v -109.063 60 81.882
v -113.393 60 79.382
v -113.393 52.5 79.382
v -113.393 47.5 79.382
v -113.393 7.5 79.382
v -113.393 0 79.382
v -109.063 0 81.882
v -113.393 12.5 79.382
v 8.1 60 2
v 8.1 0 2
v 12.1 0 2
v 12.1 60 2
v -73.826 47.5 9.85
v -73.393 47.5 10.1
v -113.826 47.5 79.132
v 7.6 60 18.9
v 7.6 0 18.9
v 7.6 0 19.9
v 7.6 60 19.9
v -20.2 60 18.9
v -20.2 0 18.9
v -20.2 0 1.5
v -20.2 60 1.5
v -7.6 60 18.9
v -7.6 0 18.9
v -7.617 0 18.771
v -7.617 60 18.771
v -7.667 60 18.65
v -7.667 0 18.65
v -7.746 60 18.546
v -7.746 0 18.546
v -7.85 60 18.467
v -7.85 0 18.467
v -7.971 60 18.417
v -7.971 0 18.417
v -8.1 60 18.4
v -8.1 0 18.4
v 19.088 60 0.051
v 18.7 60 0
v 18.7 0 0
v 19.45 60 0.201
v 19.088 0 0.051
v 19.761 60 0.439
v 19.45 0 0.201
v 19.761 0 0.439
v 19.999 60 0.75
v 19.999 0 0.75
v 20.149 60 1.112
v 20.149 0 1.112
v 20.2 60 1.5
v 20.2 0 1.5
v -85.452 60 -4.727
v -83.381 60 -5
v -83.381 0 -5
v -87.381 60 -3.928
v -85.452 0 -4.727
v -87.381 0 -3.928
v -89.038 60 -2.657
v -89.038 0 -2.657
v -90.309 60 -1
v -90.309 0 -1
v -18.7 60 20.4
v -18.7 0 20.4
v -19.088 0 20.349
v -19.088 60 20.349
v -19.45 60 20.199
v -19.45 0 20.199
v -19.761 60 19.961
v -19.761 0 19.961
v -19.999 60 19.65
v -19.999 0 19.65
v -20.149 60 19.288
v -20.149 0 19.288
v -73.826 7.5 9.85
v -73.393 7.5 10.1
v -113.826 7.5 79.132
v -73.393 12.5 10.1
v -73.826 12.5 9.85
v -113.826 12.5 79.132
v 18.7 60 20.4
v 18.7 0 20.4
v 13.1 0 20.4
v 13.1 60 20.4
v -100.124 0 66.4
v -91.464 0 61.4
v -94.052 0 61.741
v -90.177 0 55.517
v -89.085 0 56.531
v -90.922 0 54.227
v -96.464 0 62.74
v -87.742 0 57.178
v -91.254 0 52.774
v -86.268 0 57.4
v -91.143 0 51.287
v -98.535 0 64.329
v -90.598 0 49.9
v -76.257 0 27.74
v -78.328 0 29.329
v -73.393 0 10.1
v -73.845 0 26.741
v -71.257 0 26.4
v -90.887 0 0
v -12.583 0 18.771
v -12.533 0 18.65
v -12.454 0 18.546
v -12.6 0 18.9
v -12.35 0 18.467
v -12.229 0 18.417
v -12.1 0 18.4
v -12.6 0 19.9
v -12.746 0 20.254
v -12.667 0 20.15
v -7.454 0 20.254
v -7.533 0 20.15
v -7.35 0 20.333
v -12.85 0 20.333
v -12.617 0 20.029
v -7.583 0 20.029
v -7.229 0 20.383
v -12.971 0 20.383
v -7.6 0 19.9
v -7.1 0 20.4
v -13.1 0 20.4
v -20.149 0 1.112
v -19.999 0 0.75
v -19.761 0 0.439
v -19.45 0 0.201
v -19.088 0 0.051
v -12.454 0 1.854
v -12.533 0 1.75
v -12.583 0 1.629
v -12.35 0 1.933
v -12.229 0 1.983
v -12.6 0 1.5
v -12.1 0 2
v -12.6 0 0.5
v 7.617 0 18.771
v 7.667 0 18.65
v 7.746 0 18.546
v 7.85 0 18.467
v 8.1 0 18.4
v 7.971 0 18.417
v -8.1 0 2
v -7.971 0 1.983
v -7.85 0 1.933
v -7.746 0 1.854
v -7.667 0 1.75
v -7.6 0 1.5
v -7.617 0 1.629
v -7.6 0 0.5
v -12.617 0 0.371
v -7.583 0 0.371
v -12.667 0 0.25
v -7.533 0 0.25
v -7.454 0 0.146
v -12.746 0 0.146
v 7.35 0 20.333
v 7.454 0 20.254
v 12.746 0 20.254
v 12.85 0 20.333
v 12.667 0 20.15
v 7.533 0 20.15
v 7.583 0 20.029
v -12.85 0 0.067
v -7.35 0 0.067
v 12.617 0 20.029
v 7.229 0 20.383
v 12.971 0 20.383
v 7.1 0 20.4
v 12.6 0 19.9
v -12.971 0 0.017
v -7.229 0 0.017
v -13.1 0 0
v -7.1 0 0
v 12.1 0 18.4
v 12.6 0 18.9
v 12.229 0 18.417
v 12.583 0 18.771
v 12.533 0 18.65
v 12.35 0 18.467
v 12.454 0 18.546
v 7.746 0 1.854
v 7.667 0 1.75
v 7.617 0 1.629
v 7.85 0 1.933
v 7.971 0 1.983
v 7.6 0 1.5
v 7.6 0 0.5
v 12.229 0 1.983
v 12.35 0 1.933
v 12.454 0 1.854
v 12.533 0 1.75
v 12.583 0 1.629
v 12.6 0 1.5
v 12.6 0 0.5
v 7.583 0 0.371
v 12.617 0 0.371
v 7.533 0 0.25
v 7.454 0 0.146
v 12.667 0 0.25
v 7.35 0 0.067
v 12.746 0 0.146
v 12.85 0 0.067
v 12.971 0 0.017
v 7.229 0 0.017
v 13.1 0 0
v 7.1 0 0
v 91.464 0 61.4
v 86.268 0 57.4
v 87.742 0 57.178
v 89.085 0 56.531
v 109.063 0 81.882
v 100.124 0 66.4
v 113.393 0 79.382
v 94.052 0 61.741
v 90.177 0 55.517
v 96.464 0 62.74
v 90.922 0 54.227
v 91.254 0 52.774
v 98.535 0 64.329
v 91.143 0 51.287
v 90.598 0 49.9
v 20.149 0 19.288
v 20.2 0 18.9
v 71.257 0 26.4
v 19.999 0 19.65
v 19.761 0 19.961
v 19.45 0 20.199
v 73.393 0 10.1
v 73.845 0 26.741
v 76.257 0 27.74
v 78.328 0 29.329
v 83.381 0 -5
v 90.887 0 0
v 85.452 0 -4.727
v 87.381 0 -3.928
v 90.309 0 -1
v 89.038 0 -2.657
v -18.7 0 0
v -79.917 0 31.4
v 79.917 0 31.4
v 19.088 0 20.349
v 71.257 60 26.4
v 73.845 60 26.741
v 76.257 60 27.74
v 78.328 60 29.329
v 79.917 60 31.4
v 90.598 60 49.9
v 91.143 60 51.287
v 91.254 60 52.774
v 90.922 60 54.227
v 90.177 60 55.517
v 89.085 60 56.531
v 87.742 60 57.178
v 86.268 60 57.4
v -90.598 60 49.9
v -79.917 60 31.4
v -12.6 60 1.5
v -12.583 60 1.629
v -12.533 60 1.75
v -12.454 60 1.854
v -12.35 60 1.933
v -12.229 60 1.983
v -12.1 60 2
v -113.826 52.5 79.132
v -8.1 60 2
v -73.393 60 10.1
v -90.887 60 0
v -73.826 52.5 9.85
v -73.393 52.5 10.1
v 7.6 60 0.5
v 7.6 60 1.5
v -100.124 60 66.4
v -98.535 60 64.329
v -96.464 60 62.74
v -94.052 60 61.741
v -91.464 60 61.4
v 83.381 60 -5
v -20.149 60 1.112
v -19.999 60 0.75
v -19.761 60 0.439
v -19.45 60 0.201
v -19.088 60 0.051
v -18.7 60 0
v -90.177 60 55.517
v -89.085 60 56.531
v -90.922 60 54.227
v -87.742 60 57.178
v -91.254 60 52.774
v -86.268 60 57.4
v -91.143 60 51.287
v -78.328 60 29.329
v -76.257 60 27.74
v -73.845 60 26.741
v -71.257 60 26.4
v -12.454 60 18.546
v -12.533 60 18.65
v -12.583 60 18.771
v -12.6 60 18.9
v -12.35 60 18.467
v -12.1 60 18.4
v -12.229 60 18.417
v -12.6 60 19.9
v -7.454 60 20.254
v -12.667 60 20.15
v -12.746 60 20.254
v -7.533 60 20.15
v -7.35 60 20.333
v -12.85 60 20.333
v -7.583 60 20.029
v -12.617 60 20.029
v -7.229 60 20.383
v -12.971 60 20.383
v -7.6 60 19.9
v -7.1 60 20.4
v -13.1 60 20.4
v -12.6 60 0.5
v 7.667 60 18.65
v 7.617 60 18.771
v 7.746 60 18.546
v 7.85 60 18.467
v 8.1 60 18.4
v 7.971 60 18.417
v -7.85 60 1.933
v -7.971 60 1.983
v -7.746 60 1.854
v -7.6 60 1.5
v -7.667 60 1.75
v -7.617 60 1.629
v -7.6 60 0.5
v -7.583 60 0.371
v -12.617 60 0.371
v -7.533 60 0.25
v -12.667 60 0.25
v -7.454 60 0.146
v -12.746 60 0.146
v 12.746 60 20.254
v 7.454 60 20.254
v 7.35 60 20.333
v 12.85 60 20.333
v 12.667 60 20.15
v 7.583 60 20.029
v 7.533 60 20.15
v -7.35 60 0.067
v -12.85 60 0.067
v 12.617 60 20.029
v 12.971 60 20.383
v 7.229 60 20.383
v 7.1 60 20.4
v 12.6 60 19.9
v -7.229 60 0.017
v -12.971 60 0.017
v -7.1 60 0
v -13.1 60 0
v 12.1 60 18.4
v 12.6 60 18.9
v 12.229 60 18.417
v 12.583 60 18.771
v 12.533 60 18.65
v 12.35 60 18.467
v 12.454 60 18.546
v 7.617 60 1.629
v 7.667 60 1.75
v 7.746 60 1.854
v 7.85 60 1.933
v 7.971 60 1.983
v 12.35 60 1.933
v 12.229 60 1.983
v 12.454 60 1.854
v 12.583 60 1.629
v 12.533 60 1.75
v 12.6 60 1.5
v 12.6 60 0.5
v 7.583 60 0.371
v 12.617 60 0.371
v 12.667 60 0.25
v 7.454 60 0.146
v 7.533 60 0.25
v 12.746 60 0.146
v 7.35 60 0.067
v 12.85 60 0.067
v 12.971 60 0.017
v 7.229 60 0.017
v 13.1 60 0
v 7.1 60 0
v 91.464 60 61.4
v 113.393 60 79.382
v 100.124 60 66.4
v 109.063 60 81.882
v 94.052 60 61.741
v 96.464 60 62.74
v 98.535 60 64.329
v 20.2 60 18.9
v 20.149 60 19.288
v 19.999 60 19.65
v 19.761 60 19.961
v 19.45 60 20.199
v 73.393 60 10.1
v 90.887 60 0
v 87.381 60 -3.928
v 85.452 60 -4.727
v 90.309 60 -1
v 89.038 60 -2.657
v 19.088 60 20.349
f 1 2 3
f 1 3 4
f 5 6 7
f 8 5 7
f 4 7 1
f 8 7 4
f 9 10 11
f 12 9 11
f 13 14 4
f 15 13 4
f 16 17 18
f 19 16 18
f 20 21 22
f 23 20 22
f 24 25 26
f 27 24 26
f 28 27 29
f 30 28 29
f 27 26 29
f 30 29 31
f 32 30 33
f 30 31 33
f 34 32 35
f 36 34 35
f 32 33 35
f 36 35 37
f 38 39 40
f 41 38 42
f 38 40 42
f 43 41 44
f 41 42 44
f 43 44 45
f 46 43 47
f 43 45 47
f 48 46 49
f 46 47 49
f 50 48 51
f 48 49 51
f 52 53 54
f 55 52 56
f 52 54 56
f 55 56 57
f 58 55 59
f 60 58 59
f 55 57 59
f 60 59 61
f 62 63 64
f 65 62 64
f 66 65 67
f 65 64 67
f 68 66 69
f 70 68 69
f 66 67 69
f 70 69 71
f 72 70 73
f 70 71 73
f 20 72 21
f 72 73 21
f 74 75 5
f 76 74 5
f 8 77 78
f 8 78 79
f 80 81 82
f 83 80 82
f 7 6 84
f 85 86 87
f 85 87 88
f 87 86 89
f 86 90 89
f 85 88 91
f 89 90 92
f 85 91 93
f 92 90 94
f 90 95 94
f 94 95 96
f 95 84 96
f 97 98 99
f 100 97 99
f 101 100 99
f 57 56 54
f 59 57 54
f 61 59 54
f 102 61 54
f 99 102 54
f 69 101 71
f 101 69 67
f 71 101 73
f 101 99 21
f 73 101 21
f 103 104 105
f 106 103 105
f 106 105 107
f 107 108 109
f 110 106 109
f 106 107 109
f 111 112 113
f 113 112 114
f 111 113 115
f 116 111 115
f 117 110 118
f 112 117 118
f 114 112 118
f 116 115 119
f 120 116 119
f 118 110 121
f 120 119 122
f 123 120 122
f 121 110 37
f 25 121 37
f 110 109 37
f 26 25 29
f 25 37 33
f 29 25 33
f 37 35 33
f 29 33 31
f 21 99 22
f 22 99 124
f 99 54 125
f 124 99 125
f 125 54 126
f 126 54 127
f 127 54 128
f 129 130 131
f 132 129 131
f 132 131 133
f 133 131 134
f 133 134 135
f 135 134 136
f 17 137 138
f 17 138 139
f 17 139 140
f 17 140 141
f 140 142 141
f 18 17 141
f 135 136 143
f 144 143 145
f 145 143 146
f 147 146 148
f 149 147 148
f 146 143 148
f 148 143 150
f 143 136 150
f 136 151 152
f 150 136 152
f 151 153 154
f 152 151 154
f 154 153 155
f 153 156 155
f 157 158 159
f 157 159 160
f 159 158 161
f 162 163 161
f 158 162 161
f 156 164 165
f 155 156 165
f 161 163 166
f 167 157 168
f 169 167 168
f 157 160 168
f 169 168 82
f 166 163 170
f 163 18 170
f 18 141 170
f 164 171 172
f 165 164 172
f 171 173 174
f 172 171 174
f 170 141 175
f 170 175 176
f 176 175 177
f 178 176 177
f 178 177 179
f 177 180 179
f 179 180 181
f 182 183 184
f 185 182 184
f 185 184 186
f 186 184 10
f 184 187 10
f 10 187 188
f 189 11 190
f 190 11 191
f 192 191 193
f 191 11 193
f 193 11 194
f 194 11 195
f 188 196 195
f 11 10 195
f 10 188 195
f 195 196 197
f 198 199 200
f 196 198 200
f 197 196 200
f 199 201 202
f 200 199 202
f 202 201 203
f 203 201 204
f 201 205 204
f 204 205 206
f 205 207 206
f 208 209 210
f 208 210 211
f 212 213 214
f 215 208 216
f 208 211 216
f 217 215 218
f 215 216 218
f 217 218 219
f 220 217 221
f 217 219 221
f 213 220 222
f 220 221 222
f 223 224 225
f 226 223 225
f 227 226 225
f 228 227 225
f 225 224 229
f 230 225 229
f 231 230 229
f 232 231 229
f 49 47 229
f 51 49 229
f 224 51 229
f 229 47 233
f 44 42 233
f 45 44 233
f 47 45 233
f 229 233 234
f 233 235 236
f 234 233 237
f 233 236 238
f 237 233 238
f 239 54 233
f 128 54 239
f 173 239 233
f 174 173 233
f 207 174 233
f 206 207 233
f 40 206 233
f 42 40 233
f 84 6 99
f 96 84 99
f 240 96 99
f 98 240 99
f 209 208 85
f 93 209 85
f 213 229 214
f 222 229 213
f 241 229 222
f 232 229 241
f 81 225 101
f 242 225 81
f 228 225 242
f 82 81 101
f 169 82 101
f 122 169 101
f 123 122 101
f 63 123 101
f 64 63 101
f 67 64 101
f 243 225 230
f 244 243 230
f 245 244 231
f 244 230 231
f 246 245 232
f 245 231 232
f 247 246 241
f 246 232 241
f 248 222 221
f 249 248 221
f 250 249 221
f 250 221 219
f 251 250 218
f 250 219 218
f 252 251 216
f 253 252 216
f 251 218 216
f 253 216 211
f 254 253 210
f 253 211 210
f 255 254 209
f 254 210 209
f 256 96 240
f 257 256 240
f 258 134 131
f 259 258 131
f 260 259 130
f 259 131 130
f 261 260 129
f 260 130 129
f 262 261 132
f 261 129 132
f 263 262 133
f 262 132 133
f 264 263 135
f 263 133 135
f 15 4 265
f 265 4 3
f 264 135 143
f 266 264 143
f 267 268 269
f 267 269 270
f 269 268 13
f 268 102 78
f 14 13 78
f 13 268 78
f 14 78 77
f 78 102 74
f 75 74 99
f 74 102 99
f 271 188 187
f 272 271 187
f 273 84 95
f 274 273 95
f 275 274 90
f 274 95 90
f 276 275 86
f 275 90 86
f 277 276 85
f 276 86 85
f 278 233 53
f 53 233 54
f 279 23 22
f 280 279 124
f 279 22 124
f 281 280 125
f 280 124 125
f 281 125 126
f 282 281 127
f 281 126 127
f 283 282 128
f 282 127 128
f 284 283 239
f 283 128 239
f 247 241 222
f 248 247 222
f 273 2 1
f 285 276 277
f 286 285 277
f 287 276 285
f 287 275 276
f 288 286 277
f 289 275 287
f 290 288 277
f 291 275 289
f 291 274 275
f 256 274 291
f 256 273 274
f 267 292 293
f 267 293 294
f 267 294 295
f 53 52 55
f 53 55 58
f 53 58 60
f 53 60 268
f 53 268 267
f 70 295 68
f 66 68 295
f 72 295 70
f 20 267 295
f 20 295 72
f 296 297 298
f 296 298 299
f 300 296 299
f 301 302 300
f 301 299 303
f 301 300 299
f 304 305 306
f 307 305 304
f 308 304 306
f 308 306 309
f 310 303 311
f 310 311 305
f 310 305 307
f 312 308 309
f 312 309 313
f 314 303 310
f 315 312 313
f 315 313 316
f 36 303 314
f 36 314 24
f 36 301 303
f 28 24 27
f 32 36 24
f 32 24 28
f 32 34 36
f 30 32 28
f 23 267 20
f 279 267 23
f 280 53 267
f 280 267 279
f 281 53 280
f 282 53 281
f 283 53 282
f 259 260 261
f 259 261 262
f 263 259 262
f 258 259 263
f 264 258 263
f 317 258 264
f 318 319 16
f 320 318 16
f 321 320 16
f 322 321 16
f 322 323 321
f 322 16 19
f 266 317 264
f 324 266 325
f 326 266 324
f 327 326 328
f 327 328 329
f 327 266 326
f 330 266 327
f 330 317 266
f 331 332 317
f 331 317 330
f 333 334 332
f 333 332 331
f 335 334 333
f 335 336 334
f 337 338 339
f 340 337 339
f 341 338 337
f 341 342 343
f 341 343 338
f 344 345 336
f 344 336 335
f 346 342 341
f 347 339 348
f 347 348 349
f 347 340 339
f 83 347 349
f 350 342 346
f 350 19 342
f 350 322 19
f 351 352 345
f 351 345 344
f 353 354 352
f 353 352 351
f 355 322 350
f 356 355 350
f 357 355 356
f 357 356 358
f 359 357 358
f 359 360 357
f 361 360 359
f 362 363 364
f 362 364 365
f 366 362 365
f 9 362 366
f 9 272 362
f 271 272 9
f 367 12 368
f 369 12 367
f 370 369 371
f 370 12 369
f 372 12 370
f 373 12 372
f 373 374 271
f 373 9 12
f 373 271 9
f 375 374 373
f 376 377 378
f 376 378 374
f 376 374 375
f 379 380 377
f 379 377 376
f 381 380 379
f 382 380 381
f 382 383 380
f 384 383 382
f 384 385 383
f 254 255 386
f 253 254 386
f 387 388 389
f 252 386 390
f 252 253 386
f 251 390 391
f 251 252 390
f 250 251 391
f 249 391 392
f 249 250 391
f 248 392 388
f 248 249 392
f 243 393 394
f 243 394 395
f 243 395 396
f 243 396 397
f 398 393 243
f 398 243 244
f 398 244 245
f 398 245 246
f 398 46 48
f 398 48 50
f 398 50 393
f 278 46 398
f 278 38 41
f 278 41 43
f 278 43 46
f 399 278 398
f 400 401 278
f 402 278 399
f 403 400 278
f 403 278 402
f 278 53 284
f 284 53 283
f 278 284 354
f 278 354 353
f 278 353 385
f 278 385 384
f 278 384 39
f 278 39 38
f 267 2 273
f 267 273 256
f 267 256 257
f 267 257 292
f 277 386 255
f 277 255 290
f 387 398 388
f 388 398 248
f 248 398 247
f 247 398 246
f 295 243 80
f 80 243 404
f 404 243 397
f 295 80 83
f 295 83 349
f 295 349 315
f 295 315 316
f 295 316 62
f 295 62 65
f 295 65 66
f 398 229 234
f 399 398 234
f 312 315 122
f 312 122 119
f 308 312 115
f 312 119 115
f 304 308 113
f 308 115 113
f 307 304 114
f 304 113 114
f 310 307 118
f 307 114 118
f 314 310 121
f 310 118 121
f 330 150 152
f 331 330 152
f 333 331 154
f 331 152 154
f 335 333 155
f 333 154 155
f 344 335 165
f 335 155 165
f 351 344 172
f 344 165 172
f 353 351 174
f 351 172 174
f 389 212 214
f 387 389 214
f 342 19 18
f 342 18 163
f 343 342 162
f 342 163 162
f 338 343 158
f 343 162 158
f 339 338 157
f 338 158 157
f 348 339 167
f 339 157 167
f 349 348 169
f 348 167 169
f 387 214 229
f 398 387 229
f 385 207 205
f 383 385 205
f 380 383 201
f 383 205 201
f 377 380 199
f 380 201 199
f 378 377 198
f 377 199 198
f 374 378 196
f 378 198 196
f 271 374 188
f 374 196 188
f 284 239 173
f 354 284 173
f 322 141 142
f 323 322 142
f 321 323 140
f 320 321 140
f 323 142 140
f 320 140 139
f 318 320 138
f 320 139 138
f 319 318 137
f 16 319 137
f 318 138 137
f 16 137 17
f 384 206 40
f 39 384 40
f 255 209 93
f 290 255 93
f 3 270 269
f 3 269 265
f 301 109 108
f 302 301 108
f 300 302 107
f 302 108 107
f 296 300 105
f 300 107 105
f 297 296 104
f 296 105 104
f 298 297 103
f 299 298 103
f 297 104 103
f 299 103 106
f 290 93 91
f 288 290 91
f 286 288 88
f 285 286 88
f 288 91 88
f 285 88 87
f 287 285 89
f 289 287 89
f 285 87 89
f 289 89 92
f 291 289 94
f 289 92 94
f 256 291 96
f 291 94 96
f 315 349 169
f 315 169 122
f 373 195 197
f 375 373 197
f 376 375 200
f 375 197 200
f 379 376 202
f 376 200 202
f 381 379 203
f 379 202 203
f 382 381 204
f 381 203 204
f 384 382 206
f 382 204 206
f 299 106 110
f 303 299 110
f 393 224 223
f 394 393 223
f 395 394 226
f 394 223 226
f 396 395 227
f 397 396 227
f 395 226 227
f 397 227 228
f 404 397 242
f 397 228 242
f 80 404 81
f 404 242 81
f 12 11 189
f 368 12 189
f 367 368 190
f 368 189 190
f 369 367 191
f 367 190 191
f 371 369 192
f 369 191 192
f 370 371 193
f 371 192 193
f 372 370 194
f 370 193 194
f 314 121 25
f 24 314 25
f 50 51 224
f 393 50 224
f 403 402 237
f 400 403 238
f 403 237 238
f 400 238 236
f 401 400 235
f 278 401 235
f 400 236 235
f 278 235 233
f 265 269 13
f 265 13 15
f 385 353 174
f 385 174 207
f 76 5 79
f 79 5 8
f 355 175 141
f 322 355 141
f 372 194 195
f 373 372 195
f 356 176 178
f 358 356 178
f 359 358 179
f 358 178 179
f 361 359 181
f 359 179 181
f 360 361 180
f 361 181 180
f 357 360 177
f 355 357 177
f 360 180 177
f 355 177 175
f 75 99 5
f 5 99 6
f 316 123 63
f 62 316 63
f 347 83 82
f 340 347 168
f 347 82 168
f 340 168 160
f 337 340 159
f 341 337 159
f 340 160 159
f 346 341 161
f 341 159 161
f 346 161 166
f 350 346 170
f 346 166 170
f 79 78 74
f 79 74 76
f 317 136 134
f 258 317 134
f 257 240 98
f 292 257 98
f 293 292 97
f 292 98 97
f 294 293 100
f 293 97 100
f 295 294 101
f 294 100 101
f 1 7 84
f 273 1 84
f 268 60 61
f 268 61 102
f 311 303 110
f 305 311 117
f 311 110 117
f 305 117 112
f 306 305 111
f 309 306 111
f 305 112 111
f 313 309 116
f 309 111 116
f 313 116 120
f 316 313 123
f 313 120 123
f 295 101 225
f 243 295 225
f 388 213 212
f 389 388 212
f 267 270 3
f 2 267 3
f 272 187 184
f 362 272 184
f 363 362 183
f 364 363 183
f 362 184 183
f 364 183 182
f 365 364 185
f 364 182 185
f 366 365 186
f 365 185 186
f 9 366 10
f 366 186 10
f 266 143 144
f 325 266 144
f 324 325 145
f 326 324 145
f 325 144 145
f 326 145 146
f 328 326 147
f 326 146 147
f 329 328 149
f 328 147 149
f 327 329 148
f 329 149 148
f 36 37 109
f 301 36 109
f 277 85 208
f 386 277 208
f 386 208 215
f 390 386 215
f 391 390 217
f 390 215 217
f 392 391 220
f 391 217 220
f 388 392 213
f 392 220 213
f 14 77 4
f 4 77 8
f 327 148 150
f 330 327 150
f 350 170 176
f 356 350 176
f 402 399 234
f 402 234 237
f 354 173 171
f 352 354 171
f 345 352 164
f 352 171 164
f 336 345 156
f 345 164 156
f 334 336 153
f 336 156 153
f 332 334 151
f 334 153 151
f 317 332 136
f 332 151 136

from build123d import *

# Parameters (mm, degrees)
BOSS_EXTRUDE3_DEPTH = 60
SKETCH6_W           = 80
SKETCH6_H           = 5
BOSS_EXTRUDE4_DEPTH = 0.5


with BuildPart() as part:
    # Sketch5 → Boss-Extrude3 (new body)
    with BuildSketch(Plane(origin=(0, 0, 0), x_dir=(1, 0, 0), z_dir=(0, 1, 0))):
        with BuildLine():
            Line((83.381197846, 5), (-83.381197846, 5))
            ThreePointArc((-83.381197846, 5), (-87.381197846, 3.92820323), (-90.309401077, 1))
            Line((-90.309401077, 1), (-90.886751346, 0))
            Line((-90.886751346, 0), (-73.39303819, -10.1))
            Line((-73.39303819, -10.1), (-113.39303819, -79.382032303))
            Line((-113.39303819, -79.382032303), (-109.062911171, -81.882032303))
            Line((-109.062911171, -81.882032303), (-100.124355653, -66.4))
            ThreePointArc((-100.124355653, -66.4), (-96.464101615, -62.739745962), (-91.464101615, -61.4))
            Line((-91.464101615, -61.4), (91.464101615, -61.4))
            ThreePointArc((91.464101615, -61.4), (96.464101615, -62.739745962), (100.124355653, -66.4))
            Line((100.124355653, -66.4), (109.062911171, -81.882032303))
            Line((109.062911171, -81.882032303), (113.39303819, -79.382032303))
            Line((113.39303819, -79.382032303), (73.39303819, -10.1))
            Line((73.39303819, -10.1), (90.886751346, 0))
            Line((90.886751346, 0), (90.309401077, 1))
            ThreePointArc((90.309401077, 1), (87.381197846, 3.92820323), (83.381197846, 5))
        make_face()
        with BuildLine():
            Line((7.1, -20.4), (-7.1, -20.4))
            ThreePointArc((-7.1, -20.4), (-7.453553391, -20.253553391), (-7.6, -19.9))
            Line((-7.6, -19.9), (-7.6, -18.9))
            ThreePointArc((-7.6, -18.9), (-7.746446609, -18.546446609), (-8.1, -18.4))
            Line((-8.1, -18.4), (-12.1, -18.4))
            ThreePointArc((-12.1, -18.4), (-12.453553391, -18.546446609), (-12.6, -18.9))
            Line((-12.6, -18.9), (-12.6, -19.9))
            ThreePointArc((-12.6, -19.9), (-12.746446609, -20.253553391), (-13.1, -20.4))
            Line((-13.1, -20.4), (-18.7, -20.4))
            ThreePointArc((-18.7, -20.4), (-19.760660172, -19.960660172), (-20.2, -18.9))
            Line((-20.2, -18.9), (-20.2, -1.5))
            ThreePointArc((-20.2, -1.5), (-19.760660172, -0.439339828), (-18.7, 0))
            Line((-18.7, 0), (-13.1, 0))
            ThreePointArc((-13.1, 0), (-12.746446609, -0.146446609), (-12.6, -0.5))
            Line((-12.6, -0.5), (-12.6, -1.5))
            ThreePointArc((-12.6, -1.5), (-12.453553391, -1.853553391), (-12.1, -2))
            Line((-12.1, -2), (-8.1, -2))
            ThreePointArc((-8.1, -2), (-7.746446609, -1.853553391), (-7.6, -1.5))
            Line((-7.6, -1.5), (-7.6, -0.5))
            ThreePointArc((-7.6, -0.5), (-7.453553391, -0.146446609), (-7.1, 0))
            Line((-7.1, 0), (7.1, 0))
            ThreePointArc((7.1, 0), (7.453553391, -0.146446609), (7.6, -0.5))
            Line((7.6, -0.5), (7.6, -1.5))
            ThreePointArc((7.6, -1.5), (7.746446609, -1.853553391), (8.1, -2))
            Line((8.1, -2), (12.1, -2))
            ThreePointArc((12.1, -2), (12.453553391, -1.853553391), (12.6, -1.5))
            Line((12.6, -1.5), (12.6, -0.5))
            ThreePointArc((12.6, -0.5), (12.746446609, -0.146446609), (13.1, 0))
            Line((13.1, 0), (18.7, 0))
            ThreePointArc((18.7, 0), (19.760660172, -0.439339828), (20.2, -1.5))
            Line((20.2, -1.5), (20.2, -18.9))
            ThreePointArc((20.2, -18.9), (19.760660172, -19.960660172), (18.7, -20.4))
            Line((18.7, -20.4), (13.1, -20.4))
            ThreePointArc((13.1, -20.4), (12.746446609, -20.253553391), (12.6, -19.9))
            Line((12.6, -19.9), (12.6, -18.9))
            ThreePointArc((12.6, -18.9), (12.453553391, -18.546446609), (12.1, -18.4))
            Line((12.1, -18.4), (8.1, -18.4))
            ThreePointArc((8.1, -18.4), (7.746446609, -18.546446609), (7.6, -18.9))
            Line((7.6, -18.9), (7.6, -19.9))
            ThreePointArc((7.6, -19.9), (7.453553391, -20.253553391), (7.1, -20.4))
        make_face(mode=Mode.SUBTRACT)
        with BuildLine():
            Line((-71.256842194, -26.4), (71.256842194, -26.4))
            ThreePointArc((71.256842194, -26.4), (76.256842194, -27.739745962), (79.917096231, -31.4))
            Line((79.917096231, -31.4), (90.598076211, -49.9))
            ThreePointArc((90.598076211, -49.9), (90.598076211, -54.9), (86.267949192, -57.4))
            Line((86.267949192, -57.4), (-86.267949192, -57.4))
            ThreePointArc((-86.267949192, -57.4), (-90.598076211, -54.9), (-90.598076211, -49.9))
            Line((-90.598076211, -49.9), (-79.917096231, -31.4))
            ThreePointArc((-79.917096231, -31.4), (-76.256842194, -27.739745962), (-71.256842194, -26.4))
        make_face(mode=Mode.SUBTRACT)
    extrude(amount=BOSS_EXTRUDE3_DEPTH)

    # Sketch6 → Boss-Extrude4 (add)
    with BuildSketch(Plane(origin=(-50.671350353, 0, -29.255117767), x_dir=(-0.5, 0, 0.866025404), z_dir=(-0.866025404, 0, -0.5))):
        with Locations((85.443375673, 50)):
            Rectangle(SKETCH6_W, SKETCH6_H)
        with Locations((85.443375673, 10)):
            Rectangle(SKETCH6_W, SKETCH6_H)
    extrude(amount=BOSS_EXTRUDE4_DEPTH)


solid = part.part
